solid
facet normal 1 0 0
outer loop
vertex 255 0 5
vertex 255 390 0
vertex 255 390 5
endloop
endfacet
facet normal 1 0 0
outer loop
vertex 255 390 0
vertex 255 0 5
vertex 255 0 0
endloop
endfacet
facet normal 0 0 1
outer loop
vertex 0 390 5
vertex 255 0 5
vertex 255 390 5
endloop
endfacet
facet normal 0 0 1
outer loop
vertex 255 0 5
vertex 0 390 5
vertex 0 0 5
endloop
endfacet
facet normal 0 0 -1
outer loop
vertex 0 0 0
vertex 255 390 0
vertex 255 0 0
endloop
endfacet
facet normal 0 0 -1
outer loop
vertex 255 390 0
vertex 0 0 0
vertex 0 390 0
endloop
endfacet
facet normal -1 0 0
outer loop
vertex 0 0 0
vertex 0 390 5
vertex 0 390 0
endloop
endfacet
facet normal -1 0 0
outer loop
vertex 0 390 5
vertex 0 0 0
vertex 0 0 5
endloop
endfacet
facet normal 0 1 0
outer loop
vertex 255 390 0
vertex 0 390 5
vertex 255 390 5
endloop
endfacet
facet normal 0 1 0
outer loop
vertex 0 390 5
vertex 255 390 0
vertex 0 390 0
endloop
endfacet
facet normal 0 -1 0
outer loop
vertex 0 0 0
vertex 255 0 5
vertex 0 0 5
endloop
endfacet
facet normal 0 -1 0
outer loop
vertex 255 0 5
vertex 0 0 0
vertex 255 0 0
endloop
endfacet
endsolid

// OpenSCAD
font1 = "Arial:style=Bold";
cardSpacer =10;


cardHeight = 3;

bigCardWidth = 66;
bigCardDepth = 91;

smallCardWidth = 44;
smallCardDepth = 66;

boardHeight = 5;
boardWidth = 255;
boardDepth = bigCardWidth*3+smallCardDepth*2+cardSpacer*6;

healthCube = 11;
healthSpacer = 3;

cut_right();
cut_left();



module cut_left() {
    difference() {
        color("red") cube([boardWidth,boardDepth/2,boardHeight]);
        
        color("blue") translate([boardWidth*0.75,  boardDepth/2]) linear_extrude(height = 5) rotate(90,0,0) circle(40,$fn=3);%circle(20,$fn=90);
    }   
        color("pink") translate([boardWidth*0.25,  boardDepth/2]) linear_extrude(height = 5) rotate(-90,0,0) circle(40,$fn=3);%circle(20,$fn=90);
}


module cut_right() {
    difference() {
        color("red") translate([0,boardDepth/2,0])cube([boardWidth,boardDepth/2,boardHeight]);
        //translate([0,0, -1]) cube([boardWidth,boardDepth/2,boardHeight+2]);
        rotate([0,180,0]) translate([-(boardWidth/2),  boardDepth*0.3, -boardHeight]) linear_extrude(height = 5) circle(40,$fn=3);%circle(20,$fn=90);
        color("pink") translate([boardWidth*0.25,  boardDepth/2]) linear_extrude(height = 5) rotate(-90,0,0) circle(40,$fn=3);%circle(20,$fn=90);
    }
    color("blue") translate([boardWidth*0.75,  boardDepth/2]) linear_extrude(height = 5) rotate(90,0,0) circle(40,$fn=3);%circle(20,$fn=90);
}

            
